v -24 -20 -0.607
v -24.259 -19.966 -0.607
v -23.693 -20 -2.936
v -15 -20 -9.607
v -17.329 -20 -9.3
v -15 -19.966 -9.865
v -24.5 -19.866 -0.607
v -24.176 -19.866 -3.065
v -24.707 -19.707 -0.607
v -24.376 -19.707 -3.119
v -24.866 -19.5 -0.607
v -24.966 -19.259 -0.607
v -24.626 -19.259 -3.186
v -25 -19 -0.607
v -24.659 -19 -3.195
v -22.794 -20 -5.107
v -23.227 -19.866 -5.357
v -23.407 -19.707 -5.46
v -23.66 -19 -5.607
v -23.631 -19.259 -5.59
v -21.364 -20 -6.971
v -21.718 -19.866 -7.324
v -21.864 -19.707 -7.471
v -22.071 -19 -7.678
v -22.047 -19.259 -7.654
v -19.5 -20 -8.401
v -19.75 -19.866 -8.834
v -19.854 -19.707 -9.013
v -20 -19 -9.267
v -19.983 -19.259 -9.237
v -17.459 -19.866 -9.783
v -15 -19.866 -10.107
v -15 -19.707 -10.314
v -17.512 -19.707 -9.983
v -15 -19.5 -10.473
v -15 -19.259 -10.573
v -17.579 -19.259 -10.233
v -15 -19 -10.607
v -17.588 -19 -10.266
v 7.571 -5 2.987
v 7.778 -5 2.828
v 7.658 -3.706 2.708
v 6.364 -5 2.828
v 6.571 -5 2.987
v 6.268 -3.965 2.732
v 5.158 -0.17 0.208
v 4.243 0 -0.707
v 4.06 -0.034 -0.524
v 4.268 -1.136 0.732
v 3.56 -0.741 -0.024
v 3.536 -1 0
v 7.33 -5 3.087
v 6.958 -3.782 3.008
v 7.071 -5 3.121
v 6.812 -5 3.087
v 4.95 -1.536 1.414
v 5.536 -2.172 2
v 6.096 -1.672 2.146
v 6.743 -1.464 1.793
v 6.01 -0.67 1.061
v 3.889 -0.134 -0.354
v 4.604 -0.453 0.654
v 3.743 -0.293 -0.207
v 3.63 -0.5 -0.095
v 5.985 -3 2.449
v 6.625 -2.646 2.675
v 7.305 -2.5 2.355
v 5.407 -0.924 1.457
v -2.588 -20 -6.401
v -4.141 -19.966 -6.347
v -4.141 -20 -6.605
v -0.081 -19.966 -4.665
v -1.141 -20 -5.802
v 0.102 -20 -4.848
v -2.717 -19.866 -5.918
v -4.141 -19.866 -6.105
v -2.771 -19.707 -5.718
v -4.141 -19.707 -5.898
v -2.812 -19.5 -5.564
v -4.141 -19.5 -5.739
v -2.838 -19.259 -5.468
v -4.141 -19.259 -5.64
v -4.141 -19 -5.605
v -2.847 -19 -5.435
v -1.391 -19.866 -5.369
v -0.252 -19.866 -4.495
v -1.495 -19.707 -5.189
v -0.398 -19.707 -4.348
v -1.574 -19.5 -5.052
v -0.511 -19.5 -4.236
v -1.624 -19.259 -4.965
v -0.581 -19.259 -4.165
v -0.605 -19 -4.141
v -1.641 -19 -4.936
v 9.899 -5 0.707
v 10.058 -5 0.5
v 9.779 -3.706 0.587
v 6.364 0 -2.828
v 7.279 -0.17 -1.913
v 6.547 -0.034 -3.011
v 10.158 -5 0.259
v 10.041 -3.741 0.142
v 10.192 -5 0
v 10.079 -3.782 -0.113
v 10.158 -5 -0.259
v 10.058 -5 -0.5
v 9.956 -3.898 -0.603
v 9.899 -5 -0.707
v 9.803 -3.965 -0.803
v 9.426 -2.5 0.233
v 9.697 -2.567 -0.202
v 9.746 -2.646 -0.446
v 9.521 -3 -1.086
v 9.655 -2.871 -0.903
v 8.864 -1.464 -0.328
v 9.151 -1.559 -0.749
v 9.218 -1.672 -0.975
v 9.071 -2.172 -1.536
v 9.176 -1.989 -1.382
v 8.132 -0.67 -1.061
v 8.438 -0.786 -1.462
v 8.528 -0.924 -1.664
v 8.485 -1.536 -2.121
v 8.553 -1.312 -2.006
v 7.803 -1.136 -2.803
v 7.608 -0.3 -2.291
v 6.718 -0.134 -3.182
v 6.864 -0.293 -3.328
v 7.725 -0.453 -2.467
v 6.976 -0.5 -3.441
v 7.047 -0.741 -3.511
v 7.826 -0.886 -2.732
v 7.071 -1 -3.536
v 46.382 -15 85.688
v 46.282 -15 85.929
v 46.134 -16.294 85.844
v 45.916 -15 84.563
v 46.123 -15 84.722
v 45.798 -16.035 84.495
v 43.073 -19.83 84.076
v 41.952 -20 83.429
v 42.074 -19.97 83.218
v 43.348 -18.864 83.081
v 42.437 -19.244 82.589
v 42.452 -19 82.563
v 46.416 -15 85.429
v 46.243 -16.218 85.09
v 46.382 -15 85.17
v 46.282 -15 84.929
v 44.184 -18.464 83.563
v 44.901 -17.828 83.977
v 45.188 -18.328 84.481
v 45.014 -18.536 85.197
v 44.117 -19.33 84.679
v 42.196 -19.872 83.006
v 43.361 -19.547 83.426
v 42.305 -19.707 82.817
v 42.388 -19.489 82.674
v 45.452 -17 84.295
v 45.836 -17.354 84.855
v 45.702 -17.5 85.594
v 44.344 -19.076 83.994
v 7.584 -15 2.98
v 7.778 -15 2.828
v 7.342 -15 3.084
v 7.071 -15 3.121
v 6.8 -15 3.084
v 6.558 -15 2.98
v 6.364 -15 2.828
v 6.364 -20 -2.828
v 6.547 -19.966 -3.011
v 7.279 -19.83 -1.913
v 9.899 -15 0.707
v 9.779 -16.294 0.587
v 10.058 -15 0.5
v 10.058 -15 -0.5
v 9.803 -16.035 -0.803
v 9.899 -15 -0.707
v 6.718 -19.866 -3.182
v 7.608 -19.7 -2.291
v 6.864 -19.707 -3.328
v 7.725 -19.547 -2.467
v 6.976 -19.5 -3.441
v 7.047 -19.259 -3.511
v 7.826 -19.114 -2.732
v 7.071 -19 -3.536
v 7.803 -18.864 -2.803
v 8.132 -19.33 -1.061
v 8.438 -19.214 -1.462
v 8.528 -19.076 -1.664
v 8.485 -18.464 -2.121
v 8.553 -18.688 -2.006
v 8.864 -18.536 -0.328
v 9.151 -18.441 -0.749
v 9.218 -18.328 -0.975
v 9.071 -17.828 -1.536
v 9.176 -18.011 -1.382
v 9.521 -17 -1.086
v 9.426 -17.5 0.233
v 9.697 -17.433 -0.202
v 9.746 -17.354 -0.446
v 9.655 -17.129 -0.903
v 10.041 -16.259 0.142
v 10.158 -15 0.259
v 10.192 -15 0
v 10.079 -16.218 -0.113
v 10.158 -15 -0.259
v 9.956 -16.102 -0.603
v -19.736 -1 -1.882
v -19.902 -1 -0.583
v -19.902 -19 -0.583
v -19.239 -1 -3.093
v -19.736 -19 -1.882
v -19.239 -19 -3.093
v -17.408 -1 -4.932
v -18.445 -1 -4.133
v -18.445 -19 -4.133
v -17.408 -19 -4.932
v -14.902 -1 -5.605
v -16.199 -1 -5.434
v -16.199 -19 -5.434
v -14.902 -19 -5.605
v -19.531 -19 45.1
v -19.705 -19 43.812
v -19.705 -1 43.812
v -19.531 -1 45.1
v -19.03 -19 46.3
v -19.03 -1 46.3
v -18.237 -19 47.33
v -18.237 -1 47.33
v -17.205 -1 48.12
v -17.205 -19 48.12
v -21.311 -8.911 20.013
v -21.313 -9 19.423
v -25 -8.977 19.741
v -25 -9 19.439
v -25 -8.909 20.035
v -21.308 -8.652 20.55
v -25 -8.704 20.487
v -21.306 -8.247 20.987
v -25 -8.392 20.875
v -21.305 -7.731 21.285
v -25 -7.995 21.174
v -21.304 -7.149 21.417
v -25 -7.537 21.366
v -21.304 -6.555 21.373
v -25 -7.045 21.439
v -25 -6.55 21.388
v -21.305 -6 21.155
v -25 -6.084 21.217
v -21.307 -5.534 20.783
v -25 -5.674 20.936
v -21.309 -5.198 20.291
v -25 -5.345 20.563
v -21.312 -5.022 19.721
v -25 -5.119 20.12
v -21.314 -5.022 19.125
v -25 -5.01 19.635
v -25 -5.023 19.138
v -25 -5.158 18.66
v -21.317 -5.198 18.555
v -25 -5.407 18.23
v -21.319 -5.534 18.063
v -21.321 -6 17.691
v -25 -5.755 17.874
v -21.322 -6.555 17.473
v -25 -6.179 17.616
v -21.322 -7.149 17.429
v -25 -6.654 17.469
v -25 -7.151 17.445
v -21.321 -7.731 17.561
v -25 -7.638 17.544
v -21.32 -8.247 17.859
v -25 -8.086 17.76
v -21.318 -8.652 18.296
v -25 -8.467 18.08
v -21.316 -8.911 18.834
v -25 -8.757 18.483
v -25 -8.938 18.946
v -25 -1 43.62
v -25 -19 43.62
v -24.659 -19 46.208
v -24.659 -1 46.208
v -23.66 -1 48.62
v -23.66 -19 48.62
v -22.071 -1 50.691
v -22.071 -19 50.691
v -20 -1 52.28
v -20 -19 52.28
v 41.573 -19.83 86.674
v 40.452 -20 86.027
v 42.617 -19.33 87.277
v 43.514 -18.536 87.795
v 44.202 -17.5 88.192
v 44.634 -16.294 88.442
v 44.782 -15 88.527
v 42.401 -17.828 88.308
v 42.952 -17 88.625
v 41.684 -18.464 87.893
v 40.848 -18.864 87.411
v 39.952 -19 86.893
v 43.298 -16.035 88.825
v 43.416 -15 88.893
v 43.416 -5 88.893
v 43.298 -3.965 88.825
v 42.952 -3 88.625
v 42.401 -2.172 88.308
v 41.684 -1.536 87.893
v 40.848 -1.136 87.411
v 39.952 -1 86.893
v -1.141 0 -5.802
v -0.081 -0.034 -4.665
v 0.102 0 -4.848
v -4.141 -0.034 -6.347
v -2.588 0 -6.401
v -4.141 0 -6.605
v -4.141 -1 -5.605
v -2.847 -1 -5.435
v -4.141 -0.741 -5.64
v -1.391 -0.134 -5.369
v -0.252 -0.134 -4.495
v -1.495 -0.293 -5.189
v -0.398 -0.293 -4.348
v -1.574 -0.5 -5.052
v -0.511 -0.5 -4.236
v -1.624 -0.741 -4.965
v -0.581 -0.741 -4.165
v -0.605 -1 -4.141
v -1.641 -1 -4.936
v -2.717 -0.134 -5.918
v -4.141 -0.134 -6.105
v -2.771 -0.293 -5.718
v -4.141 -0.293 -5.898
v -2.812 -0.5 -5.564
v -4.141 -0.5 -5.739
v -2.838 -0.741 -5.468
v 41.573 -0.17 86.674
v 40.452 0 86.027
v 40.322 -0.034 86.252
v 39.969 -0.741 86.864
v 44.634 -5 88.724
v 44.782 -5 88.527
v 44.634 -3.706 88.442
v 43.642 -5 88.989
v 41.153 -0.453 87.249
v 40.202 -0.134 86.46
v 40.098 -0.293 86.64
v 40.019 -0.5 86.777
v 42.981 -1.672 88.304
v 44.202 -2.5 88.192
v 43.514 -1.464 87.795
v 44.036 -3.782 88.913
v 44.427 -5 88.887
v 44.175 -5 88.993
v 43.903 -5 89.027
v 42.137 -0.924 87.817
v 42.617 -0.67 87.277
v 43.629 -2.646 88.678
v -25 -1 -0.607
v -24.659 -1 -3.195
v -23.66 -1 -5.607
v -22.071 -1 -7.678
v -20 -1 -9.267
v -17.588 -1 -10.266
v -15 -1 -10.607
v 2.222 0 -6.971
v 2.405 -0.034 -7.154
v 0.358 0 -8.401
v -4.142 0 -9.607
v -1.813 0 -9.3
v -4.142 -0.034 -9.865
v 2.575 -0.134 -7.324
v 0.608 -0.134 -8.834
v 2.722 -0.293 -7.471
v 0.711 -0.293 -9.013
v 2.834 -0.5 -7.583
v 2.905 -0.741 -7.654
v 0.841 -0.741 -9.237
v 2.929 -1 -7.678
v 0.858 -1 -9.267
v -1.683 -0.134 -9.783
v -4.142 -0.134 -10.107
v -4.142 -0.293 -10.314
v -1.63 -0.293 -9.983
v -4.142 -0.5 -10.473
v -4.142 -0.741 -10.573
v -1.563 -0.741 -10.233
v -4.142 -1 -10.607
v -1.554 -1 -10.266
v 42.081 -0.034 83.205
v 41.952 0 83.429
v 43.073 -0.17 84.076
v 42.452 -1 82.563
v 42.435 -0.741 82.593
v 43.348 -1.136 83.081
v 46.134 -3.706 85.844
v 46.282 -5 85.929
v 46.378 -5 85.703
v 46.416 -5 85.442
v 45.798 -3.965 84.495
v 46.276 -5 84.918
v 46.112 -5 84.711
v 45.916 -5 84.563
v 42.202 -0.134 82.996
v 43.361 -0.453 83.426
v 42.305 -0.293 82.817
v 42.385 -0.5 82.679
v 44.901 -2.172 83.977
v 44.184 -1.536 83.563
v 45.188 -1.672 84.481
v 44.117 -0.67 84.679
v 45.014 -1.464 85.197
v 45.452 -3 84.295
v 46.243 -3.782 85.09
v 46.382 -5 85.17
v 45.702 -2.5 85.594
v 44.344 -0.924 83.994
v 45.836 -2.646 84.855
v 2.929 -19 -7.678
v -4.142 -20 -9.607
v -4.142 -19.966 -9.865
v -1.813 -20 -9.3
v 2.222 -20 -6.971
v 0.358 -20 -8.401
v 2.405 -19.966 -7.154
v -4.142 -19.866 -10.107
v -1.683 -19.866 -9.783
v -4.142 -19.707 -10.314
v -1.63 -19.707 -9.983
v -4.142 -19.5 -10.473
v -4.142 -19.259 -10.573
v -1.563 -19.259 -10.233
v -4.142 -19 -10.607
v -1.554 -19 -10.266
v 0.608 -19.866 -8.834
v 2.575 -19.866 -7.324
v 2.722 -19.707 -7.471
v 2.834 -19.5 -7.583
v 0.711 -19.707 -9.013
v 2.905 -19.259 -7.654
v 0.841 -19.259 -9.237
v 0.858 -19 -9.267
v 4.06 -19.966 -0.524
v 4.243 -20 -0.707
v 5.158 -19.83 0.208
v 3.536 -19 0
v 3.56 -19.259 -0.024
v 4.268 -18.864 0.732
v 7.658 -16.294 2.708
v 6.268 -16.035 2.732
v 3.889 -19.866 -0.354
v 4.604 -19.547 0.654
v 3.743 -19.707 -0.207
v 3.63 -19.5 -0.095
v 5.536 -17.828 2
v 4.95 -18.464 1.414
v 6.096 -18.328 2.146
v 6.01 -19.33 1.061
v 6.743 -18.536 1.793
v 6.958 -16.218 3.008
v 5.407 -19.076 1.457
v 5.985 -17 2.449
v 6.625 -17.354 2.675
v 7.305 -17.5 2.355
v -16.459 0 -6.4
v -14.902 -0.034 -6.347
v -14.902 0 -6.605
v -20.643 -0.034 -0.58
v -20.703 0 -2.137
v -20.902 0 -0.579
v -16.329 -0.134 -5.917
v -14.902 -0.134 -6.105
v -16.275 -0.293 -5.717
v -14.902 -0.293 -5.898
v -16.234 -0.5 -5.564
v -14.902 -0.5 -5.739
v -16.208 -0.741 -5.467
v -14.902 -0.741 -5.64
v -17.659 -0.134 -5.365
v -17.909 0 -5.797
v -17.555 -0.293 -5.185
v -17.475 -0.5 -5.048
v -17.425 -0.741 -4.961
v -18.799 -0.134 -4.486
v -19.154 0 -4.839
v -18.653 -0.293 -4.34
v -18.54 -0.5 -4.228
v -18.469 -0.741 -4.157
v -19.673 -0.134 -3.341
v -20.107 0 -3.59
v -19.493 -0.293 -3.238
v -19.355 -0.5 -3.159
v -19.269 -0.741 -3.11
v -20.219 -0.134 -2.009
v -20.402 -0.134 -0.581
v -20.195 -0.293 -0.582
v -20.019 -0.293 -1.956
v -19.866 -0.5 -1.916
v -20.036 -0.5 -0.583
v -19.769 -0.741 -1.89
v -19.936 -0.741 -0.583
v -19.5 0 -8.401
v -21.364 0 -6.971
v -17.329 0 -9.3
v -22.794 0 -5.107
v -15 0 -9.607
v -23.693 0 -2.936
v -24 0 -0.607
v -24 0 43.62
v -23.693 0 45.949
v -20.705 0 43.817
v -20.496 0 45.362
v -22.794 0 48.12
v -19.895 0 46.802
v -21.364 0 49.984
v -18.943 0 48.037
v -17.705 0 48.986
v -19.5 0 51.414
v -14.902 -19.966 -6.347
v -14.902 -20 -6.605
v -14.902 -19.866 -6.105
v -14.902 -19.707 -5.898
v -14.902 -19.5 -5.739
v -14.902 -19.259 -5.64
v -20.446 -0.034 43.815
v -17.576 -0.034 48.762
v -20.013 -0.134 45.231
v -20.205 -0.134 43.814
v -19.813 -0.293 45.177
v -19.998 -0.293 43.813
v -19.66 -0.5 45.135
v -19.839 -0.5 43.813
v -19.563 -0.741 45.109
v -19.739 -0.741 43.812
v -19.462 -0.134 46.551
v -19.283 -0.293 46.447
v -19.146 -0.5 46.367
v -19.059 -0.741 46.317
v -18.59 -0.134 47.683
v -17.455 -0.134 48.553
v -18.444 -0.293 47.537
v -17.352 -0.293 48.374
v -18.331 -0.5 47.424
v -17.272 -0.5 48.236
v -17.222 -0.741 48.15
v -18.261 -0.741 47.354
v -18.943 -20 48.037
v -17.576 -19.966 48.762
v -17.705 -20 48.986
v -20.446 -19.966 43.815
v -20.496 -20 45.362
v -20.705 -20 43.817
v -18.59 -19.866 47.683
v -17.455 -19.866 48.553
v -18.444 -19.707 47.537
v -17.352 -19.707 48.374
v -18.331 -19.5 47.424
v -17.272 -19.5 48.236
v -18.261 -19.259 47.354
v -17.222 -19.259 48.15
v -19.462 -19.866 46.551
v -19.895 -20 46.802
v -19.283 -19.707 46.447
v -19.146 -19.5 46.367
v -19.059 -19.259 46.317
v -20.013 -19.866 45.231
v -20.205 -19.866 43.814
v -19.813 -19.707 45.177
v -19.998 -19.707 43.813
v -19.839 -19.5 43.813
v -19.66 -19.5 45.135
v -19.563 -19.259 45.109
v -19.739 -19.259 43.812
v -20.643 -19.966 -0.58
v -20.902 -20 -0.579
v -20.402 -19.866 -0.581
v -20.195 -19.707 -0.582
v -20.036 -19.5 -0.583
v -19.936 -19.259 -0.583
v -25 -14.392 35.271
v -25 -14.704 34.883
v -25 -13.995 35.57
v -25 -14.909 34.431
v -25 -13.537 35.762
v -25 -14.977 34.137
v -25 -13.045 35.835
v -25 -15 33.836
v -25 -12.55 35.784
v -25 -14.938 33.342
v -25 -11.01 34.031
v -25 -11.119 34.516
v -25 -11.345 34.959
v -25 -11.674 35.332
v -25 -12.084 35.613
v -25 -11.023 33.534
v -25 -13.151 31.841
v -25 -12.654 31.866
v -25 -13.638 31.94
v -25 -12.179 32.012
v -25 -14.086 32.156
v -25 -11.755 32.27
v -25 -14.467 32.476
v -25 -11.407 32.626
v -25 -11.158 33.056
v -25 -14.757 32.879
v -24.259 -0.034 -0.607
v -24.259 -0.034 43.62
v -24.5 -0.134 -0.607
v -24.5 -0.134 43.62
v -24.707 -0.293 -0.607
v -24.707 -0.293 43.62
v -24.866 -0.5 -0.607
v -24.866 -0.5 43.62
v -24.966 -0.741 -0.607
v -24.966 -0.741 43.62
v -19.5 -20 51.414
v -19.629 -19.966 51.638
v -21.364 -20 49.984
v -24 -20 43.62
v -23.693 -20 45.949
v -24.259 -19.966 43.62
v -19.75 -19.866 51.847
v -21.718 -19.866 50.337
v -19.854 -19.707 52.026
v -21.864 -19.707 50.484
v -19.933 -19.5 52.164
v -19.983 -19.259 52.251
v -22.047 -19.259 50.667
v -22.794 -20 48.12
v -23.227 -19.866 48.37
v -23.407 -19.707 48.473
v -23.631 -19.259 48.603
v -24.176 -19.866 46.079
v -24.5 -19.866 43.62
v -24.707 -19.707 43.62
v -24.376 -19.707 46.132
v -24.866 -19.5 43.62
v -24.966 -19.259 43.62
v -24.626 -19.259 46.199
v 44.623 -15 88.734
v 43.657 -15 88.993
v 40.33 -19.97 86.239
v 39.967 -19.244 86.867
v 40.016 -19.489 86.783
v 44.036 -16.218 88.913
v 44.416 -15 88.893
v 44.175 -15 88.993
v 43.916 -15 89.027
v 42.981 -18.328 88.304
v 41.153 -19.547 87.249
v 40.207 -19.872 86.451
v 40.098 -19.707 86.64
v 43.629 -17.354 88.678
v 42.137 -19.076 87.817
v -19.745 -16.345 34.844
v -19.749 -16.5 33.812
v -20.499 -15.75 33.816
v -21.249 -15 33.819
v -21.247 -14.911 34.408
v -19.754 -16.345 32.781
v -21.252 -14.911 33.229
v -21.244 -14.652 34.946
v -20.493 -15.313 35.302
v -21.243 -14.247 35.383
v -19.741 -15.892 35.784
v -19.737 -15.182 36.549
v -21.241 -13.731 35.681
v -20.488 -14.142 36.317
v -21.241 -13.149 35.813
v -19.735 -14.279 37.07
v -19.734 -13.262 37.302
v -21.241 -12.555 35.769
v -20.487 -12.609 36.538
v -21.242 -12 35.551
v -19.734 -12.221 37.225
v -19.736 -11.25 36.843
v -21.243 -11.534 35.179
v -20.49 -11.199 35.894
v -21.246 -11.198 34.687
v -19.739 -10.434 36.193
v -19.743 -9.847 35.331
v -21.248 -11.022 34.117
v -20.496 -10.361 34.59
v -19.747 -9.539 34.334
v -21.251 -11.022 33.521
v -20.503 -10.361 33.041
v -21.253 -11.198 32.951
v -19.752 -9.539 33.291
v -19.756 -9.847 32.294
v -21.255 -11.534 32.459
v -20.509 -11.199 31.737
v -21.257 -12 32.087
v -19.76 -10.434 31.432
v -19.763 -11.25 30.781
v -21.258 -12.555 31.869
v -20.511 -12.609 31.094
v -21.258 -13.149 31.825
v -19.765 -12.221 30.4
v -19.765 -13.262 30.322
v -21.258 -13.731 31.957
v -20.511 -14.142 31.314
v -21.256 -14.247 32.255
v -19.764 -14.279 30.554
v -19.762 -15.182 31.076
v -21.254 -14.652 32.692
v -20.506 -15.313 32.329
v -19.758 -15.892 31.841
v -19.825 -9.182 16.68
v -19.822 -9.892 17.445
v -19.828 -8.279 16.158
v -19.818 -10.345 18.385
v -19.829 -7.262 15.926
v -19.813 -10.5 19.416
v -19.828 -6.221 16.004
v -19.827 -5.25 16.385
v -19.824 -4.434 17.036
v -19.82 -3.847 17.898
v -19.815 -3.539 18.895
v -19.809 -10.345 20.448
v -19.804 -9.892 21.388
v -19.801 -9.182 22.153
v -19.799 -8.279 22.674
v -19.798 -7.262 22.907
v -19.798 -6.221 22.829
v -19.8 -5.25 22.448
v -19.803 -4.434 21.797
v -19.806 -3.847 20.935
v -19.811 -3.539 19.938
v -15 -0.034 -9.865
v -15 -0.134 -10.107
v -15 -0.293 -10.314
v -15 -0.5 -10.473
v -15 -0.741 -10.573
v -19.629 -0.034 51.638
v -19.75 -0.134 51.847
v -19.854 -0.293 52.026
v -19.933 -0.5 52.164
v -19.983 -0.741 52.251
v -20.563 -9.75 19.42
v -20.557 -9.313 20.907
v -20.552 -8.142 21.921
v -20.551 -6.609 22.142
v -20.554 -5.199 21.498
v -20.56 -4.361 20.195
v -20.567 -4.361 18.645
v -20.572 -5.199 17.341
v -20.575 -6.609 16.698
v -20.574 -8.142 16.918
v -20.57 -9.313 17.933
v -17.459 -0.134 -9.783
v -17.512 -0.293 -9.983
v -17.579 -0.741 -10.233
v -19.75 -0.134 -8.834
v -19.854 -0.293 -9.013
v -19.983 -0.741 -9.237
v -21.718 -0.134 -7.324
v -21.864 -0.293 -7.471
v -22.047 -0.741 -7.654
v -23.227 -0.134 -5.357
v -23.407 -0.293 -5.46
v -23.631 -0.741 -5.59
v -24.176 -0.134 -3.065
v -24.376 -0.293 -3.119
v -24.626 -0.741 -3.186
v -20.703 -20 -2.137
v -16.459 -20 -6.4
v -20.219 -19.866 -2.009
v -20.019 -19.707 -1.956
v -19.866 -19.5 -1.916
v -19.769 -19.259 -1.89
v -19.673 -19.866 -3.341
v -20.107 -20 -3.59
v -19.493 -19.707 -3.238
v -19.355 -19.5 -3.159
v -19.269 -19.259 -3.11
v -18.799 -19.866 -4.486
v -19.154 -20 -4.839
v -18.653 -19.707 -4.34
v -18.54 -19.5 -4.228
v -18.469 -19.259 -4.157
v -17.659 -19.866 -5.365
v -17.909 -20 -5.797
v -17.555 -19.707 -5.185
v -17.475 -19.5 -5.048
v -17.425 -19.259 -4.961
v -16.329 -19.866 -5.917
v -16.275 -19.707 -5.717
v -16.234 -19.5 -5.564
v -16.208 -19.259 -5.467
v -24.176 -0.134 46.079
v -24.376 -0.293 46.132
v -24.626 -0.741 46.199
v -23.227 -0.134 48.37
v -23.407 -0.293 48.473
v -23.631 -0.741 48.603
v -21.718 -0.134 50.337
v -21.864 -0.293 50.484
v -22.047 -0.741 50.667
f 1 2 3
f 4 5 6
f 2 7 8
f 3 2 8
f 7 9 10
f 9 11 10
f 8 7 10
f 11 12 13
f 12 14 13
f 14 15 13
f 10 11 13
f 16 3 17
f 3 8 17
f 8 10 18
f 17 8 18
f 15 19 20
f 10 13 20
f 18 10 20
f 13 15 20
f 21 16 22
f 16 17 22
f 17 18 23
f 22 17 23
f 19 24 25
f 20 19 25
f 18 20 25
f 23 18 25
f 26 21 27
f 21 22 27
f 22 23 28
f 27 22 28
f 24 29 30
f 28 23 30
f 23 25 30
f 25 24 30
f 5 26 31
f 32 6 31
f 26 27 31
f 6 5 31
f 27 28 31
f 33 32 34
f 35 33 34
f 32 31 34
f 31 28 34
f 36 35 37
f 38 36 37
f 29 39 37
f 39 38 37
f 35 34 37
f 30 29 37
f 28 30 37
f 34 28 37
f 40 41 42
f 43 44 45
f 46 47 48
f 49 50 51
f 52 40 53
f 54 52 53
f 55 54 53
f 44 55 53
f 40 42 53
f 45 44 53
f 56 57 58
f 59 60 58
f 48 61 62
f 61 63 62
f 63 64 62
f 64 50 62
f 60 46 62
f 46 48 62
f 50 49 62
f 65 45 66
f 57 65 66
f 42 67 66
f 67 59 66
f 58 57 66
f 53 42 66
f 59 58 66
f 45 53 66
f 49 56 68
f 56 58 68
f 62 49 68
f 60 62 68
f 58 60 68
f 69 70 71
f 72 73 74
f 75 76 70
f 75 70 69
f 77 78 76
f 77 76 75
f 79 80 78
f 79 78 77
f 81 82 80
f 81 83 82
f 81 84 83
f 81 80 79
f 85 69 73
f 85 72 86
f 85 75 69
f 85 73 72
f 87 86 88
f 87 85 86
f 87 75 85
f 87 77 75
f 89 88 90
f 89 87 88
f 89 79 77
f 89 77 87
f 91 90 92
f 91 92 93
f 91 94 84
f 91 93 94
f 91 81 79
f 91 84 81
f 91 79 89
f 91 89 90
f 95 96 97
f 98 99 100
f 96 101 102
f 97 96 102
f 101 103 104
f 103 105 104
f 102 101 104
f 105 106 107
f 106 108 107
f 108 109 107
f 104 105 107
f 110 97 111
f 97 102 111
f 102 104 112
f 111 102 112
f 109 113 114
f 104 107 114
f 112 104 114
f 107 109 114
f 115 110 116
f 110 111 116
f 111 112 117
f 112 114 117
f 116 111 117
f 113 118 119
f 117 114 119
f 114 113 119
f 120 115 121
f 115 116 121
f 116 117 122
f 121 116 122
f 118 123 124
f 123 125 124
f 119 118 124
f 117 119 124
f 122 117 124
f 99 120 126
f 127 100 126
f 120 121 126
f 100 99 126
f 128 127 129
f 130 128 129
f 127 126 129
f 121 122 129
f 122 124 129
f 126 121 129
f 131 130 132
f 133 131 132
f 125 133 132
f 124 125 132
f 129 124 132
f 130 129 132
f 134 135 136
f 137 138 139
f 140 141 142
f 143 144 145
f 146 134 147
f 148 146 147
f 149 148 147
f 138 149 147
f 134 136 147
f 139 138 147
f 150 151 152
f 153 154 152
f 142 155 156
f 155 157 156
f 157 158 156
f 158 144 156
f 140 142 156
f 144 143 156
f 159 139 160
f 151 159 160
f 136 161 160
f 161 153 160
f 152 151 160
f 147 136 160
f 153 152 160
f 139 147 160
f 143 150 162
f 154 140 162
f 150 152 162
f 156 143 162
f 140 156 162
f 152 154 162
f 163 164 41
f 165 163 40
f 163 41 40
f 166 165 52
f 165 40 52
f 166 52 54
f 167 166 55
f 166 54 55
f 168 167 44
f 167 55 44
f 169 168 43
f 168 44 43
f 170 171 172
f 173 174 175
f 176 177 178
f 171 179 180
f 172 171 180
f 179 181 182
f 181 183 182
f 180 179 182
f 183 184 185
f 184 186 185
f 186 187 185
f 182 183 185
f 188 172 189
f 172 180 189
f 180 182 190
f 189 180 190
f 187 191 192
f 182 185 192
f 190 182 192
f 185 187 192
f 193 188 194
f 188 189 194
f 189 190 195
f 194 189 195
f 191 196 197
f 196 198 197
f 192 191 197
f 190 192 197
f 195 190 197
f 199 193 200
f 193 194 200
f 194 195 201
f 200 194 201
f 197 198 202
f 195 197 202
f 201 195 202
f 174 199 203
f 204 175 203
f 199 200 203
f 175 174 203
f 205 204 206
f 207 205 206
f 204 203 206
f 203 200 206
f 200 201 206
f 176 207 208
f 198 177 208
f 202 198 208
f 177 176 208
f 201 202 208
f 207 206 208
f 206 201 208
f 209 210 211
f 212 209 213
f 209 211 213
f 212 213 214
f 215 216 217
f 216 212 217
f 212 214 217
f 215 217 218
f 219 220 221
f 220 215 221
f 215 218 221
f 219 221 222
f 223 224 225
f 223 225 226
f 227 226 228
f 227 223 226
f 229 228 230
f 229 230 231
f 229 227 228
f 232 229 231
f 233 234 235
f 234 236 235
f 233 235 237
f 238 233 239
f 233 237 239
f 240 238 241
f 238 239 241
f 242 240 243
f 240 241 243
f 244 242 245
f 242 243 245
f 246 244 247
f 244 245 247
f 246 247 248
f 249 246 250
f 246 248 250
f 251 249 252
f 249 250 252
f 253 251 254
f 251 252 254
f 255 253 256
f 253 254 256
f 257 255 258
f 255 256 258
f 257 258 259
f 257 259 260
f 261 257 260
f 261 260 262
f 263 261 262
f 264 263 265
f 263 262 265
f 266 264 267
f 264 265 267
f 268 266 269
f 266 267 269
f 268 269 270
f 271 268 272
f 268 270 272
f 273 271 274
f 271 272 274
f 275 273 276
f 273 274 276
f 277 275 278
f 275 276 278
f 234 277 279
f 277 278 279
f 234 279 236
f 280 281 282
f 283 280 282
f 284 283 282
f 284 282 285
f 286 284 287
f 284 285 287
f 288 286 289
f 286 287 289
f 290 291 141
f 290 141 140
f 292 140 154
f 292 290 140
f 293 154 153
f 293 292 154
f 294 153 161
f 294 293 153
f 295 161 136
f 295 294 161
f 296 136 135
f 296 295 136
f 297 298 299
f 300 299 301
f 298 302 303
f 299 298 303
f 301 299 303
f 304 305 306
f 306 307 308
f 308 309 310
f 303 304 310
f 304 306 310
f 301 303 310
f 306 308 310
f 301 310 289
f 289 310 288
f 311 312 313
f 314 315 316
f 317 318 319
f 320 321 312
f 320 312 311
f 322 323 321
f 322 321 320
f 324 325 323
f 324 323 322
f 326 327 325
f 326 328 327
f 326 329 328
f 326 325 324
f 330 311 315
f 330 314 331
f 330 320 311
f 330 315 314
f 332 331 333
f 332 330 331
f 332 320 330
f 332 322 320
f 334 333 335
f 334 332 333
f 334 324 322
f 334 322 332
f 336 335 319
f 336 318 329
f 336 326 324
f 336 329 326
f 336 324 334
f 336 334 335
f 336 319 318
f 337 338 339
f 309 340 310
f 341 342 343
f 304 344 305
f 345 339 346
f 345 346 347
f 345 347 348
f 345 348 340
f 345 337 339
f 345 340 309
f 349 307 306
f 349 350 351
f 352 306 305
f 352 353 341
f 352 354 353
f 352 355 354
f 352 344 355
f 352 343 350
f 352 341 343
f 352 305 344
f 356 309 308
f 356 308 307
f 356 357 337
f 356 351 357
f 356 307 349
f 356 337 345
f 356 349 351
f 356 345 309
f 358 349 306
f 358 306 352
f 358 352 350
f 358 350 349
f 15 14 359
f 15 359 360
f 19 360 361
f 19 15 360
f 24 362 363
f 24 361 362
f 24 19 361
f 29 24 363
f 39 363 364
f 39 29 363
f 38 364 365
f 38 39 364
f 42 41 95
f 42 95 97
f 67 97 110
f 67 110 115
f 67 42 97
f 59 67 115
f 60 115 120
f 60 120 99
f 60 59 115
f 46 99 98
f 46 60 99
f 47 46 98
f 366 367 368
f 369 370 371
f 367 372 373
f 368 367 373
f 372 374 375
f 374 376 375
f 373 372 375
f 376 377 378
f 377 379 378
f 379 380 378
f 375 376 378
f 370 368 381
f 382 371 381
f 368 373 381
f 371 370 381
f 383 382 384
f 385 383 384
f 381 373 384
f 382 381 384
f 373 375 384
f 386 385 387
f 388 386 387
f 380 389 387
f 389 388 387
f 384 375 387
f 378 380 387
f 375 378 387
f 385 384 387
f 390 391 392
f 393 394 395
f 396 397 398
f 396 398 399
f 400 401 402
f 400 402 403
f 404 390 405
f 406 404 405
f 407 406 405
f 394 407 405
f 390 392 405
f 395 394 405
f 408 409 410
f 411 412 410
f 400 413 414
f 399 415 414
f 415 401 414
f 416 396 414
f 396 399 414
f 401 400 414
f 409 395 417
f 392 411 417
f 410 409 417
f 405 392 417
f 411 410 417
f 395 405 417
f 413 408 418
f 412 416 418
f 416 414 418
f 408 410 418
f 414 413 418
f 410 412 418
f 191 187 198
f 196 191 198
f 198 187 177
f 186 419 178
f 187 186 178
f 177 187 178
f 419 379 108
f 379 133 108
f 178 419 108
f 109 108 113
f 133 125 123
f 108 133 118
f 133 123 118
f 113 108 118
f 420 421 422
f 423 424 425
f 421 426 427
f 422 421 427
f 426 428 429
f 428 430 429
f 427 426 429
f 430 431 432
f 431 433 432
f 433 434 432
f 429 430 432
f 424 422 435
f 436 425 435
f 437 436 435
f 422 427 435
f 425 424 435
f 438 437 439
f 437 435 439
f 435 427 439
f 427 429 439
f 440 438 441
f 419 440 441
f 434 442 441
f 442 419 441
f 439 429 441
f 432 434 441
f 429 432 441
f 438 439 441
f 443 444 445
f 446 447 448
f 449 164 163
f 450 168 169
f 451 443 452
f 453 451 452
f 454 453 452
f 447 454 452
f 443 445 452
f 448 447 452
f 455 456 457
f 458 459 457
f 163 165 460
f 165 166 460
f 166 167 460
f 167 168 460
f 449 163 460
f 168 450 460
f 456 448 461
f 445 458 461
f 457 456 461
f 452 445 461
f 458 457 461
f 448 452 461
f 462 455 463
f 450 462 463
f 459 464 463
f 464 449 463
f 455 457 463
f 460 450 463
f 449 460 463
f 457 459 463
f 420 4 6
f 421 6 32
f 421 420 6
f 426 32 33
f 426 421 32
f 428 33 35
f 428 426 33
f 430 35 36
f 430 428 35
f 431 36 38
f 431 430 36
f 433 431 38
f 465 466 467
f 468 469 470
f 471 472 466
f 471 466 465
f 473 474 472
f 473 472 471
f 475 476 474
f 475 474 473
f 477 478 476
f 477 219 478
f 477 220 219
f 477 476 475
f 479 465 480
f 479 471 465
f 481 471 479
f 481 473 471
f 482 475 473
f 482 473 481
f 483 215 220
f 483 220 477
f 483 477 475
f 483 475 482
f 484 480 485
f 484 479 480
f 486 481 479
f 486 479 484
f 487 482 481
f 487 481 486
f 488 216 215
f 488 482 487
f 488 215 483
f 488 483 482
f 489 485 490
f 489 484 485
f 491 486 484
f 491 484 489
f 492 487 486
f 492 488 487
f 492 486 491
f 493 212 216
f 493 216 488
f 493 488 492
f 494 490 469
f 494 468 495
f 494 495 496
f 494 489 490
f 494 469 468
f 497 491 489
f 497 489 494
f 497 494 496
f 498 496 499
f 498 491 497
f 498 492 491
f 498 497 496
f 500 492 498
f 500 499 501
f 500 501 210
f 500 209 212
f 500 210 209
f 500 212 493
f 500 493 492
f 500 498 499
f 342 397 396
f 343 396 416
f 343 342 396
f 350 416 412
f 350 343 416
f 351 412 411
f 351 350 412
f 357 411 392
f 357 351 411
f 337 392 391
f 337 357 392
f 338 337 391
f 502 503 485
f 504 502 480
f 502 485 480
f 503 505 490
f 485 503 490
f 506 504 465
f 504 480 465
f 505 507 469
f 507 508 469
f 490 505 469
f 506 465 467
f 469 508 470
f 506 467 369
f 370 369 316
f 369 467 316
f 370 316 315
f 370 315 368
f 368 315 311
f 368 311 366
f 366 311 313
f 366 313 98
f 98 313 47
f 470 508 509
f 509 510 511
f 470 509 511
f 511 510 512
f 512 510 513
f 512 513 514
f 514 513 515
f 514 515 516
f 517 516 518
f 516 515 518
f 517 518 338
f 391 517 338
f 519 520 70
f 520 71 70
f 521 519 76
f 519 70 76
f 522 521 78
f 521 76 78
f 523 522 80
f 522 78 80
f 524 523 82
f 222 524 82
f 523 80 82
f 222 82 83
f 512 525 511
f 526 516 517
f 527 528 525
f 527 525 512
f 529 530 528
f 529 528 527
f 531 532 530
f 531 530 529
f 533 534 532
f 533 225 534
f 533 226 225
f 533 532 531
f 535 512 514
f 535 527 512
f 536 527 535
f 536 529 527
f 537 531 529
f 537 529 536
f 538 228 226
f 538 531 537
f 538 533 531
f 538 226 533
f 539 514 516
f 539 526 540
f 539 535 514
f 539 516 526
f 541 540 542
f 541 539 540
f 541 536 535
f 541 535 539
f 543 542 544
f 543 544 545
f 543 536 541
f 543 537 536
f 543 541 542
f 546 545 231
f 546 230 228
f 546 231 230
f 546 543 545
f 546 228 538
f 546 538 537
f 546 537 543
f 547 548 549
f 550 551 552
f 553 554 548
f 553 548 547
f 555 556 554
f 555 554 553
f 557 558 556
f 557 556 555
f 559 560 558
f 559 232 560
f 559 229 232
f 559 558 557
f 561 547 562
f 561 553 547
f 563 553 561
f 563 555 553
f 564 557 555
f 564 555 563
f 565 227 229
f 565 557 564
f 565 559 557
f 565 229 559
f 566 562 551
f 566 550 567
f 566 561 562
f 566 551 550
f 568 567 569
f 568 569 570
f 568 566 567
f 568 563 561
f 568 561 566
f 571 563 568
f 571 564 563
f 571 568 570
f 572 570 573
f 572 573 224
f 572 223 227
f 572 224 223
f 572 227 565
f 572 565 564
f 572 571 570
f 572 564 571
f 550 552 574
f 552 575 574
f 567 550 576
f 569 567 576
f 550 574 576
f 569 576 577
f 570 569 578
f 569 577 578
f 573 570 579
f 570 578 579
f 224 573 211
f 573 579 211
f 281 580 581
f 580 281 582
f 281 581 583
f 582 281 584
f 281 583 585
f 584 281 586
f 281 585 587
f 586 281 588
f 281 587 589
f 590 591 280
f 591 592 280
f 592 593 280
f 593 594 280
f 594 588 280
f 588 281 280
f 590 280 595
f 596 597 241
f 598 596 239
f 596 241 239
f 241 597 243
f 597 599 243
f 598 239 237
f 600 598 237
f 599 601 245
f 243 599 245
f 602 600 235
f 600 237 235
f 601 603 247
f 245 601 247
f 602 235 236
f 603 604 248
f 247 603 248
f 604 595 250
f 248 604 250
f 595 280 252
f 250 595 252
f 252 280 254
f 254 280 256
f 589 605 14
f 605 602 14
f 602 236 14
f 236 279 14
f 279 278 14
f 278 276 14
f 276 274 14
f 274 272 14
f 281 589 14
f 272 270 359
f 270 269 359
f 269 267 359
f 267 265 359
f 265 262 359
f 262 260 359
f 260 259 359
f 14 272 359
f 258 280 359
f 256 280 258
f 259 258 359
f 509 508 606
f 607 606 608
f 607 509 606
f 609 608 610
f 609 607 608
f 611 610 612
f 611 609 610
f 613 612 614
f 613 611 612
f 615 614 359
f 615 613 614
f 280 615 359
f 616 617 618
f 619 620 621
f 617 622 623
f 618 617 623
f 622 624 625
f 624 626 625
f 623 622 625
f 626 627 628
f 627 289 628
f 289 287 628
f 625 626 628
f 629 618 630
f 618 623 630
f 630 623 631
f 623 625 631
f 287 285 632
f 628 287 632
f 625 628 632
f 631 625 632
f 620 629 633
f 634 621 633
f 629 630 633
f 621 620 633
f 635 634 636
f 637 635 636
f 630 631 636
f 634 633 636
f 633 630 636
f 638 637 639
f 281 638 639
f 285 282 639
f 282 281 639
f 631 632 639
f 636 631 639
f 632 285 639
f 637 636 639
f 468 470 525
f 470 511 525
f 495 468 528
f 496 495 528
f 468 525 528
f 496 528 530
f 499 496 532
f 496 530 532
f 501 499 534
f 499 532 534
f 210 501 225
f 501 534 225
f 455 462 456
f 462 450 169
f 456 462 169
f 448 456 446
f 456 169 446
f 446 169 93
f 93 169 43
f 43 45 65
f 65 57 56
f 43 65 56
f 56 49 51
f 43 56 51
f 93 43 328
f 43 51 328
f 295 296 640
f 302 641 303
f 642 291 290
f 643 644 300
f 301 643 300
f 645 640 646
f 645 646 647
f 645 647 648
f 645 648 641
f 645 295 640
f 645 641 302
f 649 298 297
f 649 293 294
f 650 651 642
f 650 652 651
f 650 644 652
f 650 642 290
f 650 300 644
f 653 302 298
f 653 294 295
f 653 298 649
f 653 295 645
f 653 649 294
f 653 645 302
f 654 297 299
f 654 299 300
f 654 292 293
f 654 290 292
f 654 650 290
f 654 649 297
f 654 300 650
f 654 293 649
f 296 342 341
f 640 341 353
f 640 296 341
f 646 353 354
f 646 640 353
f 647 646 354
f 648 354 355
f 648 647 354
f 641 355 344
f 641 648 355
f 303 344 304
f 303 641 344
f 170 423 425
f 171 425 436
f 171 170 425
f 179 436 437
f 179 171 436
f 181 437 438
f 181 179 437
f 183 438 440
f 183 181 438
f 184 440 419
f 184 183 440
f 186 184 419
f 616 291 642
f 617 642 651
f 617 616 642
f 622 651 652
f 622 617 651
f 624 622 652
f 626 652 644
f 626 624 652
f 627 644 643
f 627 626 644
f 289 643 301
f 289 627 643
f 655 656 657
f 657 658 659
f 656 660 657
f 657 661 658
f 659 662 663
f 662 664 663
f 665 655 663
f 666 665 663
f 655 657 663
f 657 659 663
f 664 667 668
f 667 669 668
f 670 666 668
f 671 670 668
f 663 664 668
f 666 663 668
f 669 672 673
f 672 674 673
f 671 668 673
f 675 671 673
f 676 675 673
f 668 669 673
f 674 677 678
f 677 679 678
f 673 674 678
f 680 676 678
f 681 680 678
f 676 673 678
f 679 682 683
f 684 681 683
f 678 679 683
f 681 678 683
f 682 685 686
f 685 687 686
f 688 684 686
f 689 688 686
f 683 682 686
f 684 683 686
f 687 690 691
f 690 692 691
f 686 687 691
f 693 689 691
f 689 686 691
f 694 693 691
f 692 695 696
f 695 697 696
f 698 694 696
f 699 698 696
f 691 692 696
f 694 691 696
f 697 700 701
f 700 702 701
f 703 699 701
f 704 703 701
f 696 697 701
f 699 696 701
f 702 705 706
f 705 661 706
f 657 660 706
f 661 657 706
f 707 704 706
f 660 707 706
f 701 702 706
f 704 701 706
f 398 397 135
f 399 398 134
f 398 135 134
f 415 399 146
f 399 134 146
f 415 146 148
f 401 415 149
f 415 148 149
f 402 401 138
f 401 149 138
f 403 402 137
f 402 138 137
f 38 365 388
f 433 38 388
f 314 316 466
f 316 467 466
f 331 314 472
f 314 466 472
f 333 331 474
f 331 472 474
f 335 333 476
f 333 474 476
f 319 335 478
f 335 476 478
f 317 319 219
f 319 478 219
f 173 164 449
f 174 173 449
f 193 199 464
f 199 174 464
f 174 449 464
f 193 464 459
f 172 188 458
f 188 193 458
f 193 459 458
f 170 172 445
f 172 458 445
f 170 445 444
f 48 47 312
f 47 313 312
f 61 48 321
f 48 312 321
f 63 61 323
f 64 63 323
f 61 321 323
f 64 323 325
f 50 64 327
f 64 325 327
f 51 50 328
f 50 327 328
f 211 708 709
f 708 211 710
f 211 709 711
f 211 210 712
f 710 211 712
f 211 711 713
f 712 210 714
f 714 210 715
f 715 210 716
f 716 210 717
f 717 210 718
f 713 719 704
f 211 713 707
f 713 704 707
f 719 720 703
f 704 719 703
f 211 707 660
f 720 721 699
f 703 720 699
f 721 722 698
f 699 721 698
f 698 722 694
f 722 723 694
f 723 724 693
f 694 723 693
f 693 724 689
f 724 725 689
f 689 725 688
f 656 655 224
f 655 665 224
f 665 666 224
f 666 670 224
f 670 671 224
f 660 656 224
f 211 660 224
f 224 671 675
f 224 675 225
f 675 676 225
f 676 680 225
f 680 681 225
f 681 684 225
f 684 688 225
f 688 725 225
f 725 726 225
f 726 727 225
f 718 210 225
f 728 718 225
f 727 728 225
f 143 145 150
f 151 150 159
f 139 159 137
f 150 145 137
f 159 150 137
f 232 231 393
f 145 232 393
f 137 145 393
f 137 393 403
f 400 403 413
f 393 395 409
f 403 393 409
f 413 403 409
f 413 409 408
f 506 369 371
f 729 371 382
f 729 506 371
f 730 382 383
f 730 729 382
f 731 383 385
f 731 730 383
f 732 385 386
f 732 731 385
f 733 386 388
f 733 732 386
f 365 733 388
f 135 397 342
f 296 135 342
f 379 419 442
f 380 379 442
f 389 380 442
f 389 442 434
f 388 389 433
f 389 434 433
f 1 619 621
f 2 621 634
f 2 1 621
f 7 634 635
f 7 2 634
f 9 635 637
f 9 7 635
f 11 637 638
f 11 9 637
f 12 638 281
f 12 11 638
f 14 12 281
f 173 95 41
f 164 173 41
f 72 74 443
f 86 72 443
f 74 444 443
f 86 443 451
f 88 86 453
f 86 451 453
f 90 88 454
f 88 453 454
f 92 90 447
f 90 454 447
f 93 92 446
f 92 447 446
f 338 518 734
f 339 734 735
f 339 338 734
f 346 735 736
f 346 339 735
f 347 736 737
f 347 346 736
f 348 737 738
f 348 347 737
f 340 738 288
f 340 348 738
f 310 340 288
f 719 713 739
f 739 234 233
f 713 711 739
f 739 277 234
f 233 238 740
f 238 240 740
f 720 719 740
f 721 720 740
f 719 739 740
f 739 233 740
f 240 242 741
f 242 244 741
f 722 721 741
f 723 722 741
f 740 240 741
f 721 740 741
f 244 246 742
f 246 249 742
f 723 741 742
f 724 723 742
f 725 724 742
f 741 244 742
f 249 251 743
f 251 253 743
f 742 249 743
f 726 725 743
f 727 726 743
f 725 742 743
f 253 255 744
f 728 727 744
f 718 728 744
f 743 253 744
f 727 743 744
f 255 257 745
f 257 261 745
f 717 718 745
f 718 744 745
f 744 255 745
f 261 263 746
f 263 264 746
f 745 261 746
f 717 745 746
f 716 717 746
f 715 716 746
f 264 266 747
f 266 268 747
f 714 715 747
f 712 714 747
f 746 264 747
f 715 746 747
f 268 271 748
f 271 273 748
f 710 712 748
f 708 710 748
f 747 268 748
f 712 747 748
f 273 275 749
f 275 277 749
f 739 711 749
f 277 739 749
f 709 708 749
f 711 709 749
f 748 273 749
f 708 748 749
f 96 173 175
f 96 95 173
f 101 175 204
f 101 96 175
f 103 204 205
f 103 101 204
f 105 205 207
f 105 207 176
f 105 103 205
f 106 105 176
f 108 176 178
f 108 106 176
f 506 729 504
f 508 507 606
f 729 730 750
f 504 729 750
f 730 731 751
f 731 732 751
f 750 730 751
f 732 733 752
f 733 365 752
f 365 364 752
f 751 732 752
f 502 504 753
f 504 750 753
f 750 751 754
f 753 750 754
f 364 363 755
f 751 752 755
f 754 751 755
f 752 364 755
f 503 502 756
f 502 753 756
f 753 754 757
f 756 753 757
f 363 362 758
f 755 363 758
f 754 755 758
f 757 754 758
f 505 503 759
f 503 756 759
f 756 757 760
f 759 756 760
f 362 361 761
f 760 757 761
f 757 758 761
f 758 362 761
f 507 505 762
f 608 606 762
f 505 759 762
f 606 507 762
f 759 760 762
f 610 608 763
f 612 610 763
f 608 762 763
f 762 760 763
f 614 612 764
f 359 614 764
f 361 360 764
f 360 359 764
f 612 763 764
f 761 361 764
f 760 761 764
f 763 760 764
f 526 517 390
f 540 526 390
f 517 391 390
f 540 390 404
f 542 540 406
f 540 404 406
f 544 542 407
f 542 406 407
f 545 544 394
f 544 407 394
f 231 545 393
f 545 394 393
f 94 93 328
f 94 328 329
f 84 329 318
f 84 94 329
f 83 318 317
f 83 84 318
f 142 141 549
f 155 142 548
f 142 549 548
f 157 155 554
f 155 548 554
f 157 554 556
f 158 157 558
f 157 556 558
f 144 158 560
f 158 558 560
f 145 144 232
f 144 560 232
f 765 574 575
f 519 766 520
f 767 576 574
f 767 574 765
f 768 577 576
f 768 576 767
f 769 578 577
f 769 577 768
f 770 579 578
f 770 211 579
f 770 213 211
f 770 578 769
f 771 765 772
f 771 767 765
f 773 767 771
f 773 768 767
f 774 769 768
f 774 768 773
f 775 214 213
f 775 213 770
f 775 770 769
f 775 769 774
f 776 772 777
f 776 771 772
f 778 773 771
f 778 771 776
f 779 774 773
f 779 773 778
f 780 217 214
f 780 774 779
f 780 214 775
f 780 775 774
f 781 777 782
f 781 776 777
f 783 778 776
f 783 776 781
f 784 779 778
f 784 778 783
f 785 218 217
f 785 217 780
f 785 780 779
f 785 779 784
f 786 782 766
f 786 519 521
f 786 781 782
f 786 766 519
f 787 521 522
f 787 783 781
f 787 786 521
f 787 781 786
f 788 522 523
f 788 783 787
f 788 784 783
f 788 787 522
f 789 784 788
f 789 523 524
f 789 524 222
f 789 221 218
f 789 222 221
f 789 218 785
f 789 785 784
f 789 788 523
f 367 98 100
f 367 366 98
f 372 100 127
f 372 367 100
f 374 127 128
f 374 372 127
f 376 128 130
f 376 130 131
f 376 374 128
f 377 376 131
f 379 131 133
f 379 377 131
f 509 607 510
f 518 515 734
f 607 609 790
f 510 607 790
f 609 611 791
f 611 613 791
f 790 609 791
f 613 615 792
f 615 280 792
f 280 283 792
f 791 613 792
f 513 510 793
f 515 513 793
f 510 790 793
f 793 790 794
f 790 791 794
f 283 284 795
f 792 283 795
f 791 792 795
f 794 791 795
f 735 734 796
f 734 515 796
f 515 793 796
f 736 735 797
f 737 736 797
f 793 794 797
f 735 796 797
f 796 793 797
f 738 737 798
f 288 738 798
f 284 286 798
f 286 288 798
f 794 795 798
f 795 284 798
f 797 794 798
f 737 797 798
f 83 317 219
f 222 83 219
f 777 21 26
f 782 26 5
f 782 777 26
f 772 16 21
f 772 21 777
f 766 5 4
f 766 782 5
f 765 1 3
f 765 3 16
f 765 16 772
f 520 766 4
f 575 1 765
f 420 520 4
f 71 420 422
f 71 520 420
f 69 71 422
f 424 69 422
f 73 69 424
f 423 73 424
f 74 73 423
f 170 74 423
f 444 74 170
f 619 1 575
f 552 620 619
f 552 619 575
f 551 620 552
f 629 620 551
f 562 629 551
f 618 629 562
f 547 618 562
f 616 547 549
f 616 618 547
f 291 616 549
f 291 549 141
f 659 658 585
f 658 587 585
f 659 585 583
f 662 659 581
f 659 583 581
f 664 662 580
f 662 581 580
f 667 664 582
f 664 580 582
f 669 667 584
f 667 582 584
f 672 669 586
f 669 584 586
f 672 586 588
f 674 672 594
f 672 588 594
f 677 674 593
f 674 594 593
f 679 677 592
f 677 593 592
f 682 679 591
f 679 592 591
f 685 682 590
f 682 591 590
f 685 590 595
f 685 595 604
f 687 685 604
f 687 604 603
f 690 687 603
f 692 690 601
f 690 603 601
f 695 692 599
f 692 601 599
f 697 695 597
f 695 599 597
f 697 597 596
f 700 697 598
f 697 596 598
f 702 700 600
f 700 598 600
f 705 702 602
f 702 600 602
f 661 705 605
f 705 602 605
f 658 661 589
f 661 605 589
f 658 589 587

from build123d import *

# Parameters (mm, degrees)
F1_DEPTH        = 20
F2_R            = 10
F3_R            = 10
F4_R            = 5
F5_R            = 5
F6_R            = 10
F7_R            = 5
F8_R            = 5
F9_R            = 5
F10_R           = 5
F11_R           = 5
F12_R           = 1
F14_D           = 4
F14_CSINK_D     = 7
F14_CSINK_ANGLE = 90


with BuildPart() as f1:
    # F0 (on Front) → F1 (new body)
    with BuildSketch(Plane.XZ):
        Polygon((0, -10.6066017178), (10.6066017178, 0), (7.0710678119, 3.5355339059), (-2.069922974, -5.6054568799), (-19.9238533878, -5.6054568799), (-19.6924897674, 46.6841880518), (46.7820323028, 85.0632712633), (44.2820323028, 89.3933982822), (-25, 49.3933982822), (-25, -10.6066017178), align=None)
    extrude(amount=F1_DEPTH)

    # F2
    f2_edges = [f1.edges().sort_by_distance(p)[0] for p in [
        (-25, -10, -10.606602),
    ]]
    fillet(f2_edges, radius=F2_R)

    # F3
    f3_edges = [f1.edges().sort_by_distance(p)[0] for p in [
        (-25, -10, 49.393398),
    ]]
    fillet(f3_edges, radius=F3_R)

    # F4
    f4_edges = [f1.edges().sort_by_distance(p)[0] for p in [
        (-19.923853, -10, -5.605457),
    ]]
    fillet(f4_edges, radius=F4_R)

    # F5
    f5_edges = [f1.edges().sort_by_distance(p)[0] for p in [
        (-19.69249, -10, 46.684188),
    ]]
    fillet(f5_edges, radius=F5_R)

    # F6
    f6_edges = [f1.edges().sort_by_distance(p)[0] for p in [
        (0, -10, -10.606602),
    ]]
    fillet(f6_edges, radius=F6_R)

    # F7
    f7_edges = [f1.edges().sort_by_distance(p)[0] for p in [
        (-2.069923, -10, -5.605457),
    ]]
    fillet(f7_edges, radius=F7_R)

    # F8
    f8_edges = [f1.edges().sort_by_distance(p)[0] for p in [
        (8.838835, -20, 1.767767),
    ]]
    fillet(f8_edges, radius=F8_R)

    # F9
    f9_edges = [f1.edges().sort_by_distance(p)[0] for p in [
        (8.838835, 0, 1.767767),
    ]]
    fillet(f9_edges, radius=F9_R)

    # F10
    f10_edges = [f1.edges().sort_by_distance(p)[0] for p in [
        (45.532032, -20, 87.228335),
    ]]
    fillet(f10_edges, radius=F10_R)

    # F11
    f11_edges = [f1.edges().sort_by_distance(p)[0] for p in [
        (45.532032, 0, 87.228335),
    ]]
    fillet(f11_edges, radius=F11_R)

    # F12
    f12_edges = [f1.edges().sort_by_distance(p)[0] for p in [
        (1.465039, 0, -2.070495),
        (9.571068, -1.464466, -1.035534),
        (10.606602, -10, 0),
        (9.571068, -18.535534, -1.035534),
        (5, -20, -5.606602),
        (-0.315301, -20, -9.845397),
        (-9.571068, -20, -10.606602),
        (-22.071068, -20, -7.67767),
        (-25, -20, 21.506647),
        (-23.660254, -20, 48.619896),
        (9.975953, -20, 69.586774),
        (-18.445028, -20, -4.13316),
        (-9.521336, -20, -5.605457),
        (-2.227574, -20, -5.224855),
        (1.465039, -20, -2.070495),
        (6.035534, -18.535534, 2.5),
        (-19.803415, -20, 21.61443),
        (-19.029832, -20, 46.299645),
        (12.623329, -20, 65.341735),
        (45.513767, -18.535534, 84.331038),
        (46.782032, -10, 85.063271),
        (44.282032, -10, 89.393398),
        (43.013767, -18.535534, 88.661165),
        (7.071068, -10, 3.535534),
        (6.035534, -1.464466, 2.5),
    ]]
    fillet(f12_edges, radius=F12_R)

    # F14 (through all)
    with Locations(Plane(origin=(-19.8986616096, 0, 0.0880447056), x_dir=(0, 1, 0), z_dir=(0.9999902114, 0, -0.0044246113))):
        with Locations((-13, 33.72457808), (-7, 19.3286148992)):
            CounterSinkHole(F14_D / 2, F14_CSINK_D / 2, counter_sink_angle=F14_CSINK_ANGLE)


solid = f1.part
